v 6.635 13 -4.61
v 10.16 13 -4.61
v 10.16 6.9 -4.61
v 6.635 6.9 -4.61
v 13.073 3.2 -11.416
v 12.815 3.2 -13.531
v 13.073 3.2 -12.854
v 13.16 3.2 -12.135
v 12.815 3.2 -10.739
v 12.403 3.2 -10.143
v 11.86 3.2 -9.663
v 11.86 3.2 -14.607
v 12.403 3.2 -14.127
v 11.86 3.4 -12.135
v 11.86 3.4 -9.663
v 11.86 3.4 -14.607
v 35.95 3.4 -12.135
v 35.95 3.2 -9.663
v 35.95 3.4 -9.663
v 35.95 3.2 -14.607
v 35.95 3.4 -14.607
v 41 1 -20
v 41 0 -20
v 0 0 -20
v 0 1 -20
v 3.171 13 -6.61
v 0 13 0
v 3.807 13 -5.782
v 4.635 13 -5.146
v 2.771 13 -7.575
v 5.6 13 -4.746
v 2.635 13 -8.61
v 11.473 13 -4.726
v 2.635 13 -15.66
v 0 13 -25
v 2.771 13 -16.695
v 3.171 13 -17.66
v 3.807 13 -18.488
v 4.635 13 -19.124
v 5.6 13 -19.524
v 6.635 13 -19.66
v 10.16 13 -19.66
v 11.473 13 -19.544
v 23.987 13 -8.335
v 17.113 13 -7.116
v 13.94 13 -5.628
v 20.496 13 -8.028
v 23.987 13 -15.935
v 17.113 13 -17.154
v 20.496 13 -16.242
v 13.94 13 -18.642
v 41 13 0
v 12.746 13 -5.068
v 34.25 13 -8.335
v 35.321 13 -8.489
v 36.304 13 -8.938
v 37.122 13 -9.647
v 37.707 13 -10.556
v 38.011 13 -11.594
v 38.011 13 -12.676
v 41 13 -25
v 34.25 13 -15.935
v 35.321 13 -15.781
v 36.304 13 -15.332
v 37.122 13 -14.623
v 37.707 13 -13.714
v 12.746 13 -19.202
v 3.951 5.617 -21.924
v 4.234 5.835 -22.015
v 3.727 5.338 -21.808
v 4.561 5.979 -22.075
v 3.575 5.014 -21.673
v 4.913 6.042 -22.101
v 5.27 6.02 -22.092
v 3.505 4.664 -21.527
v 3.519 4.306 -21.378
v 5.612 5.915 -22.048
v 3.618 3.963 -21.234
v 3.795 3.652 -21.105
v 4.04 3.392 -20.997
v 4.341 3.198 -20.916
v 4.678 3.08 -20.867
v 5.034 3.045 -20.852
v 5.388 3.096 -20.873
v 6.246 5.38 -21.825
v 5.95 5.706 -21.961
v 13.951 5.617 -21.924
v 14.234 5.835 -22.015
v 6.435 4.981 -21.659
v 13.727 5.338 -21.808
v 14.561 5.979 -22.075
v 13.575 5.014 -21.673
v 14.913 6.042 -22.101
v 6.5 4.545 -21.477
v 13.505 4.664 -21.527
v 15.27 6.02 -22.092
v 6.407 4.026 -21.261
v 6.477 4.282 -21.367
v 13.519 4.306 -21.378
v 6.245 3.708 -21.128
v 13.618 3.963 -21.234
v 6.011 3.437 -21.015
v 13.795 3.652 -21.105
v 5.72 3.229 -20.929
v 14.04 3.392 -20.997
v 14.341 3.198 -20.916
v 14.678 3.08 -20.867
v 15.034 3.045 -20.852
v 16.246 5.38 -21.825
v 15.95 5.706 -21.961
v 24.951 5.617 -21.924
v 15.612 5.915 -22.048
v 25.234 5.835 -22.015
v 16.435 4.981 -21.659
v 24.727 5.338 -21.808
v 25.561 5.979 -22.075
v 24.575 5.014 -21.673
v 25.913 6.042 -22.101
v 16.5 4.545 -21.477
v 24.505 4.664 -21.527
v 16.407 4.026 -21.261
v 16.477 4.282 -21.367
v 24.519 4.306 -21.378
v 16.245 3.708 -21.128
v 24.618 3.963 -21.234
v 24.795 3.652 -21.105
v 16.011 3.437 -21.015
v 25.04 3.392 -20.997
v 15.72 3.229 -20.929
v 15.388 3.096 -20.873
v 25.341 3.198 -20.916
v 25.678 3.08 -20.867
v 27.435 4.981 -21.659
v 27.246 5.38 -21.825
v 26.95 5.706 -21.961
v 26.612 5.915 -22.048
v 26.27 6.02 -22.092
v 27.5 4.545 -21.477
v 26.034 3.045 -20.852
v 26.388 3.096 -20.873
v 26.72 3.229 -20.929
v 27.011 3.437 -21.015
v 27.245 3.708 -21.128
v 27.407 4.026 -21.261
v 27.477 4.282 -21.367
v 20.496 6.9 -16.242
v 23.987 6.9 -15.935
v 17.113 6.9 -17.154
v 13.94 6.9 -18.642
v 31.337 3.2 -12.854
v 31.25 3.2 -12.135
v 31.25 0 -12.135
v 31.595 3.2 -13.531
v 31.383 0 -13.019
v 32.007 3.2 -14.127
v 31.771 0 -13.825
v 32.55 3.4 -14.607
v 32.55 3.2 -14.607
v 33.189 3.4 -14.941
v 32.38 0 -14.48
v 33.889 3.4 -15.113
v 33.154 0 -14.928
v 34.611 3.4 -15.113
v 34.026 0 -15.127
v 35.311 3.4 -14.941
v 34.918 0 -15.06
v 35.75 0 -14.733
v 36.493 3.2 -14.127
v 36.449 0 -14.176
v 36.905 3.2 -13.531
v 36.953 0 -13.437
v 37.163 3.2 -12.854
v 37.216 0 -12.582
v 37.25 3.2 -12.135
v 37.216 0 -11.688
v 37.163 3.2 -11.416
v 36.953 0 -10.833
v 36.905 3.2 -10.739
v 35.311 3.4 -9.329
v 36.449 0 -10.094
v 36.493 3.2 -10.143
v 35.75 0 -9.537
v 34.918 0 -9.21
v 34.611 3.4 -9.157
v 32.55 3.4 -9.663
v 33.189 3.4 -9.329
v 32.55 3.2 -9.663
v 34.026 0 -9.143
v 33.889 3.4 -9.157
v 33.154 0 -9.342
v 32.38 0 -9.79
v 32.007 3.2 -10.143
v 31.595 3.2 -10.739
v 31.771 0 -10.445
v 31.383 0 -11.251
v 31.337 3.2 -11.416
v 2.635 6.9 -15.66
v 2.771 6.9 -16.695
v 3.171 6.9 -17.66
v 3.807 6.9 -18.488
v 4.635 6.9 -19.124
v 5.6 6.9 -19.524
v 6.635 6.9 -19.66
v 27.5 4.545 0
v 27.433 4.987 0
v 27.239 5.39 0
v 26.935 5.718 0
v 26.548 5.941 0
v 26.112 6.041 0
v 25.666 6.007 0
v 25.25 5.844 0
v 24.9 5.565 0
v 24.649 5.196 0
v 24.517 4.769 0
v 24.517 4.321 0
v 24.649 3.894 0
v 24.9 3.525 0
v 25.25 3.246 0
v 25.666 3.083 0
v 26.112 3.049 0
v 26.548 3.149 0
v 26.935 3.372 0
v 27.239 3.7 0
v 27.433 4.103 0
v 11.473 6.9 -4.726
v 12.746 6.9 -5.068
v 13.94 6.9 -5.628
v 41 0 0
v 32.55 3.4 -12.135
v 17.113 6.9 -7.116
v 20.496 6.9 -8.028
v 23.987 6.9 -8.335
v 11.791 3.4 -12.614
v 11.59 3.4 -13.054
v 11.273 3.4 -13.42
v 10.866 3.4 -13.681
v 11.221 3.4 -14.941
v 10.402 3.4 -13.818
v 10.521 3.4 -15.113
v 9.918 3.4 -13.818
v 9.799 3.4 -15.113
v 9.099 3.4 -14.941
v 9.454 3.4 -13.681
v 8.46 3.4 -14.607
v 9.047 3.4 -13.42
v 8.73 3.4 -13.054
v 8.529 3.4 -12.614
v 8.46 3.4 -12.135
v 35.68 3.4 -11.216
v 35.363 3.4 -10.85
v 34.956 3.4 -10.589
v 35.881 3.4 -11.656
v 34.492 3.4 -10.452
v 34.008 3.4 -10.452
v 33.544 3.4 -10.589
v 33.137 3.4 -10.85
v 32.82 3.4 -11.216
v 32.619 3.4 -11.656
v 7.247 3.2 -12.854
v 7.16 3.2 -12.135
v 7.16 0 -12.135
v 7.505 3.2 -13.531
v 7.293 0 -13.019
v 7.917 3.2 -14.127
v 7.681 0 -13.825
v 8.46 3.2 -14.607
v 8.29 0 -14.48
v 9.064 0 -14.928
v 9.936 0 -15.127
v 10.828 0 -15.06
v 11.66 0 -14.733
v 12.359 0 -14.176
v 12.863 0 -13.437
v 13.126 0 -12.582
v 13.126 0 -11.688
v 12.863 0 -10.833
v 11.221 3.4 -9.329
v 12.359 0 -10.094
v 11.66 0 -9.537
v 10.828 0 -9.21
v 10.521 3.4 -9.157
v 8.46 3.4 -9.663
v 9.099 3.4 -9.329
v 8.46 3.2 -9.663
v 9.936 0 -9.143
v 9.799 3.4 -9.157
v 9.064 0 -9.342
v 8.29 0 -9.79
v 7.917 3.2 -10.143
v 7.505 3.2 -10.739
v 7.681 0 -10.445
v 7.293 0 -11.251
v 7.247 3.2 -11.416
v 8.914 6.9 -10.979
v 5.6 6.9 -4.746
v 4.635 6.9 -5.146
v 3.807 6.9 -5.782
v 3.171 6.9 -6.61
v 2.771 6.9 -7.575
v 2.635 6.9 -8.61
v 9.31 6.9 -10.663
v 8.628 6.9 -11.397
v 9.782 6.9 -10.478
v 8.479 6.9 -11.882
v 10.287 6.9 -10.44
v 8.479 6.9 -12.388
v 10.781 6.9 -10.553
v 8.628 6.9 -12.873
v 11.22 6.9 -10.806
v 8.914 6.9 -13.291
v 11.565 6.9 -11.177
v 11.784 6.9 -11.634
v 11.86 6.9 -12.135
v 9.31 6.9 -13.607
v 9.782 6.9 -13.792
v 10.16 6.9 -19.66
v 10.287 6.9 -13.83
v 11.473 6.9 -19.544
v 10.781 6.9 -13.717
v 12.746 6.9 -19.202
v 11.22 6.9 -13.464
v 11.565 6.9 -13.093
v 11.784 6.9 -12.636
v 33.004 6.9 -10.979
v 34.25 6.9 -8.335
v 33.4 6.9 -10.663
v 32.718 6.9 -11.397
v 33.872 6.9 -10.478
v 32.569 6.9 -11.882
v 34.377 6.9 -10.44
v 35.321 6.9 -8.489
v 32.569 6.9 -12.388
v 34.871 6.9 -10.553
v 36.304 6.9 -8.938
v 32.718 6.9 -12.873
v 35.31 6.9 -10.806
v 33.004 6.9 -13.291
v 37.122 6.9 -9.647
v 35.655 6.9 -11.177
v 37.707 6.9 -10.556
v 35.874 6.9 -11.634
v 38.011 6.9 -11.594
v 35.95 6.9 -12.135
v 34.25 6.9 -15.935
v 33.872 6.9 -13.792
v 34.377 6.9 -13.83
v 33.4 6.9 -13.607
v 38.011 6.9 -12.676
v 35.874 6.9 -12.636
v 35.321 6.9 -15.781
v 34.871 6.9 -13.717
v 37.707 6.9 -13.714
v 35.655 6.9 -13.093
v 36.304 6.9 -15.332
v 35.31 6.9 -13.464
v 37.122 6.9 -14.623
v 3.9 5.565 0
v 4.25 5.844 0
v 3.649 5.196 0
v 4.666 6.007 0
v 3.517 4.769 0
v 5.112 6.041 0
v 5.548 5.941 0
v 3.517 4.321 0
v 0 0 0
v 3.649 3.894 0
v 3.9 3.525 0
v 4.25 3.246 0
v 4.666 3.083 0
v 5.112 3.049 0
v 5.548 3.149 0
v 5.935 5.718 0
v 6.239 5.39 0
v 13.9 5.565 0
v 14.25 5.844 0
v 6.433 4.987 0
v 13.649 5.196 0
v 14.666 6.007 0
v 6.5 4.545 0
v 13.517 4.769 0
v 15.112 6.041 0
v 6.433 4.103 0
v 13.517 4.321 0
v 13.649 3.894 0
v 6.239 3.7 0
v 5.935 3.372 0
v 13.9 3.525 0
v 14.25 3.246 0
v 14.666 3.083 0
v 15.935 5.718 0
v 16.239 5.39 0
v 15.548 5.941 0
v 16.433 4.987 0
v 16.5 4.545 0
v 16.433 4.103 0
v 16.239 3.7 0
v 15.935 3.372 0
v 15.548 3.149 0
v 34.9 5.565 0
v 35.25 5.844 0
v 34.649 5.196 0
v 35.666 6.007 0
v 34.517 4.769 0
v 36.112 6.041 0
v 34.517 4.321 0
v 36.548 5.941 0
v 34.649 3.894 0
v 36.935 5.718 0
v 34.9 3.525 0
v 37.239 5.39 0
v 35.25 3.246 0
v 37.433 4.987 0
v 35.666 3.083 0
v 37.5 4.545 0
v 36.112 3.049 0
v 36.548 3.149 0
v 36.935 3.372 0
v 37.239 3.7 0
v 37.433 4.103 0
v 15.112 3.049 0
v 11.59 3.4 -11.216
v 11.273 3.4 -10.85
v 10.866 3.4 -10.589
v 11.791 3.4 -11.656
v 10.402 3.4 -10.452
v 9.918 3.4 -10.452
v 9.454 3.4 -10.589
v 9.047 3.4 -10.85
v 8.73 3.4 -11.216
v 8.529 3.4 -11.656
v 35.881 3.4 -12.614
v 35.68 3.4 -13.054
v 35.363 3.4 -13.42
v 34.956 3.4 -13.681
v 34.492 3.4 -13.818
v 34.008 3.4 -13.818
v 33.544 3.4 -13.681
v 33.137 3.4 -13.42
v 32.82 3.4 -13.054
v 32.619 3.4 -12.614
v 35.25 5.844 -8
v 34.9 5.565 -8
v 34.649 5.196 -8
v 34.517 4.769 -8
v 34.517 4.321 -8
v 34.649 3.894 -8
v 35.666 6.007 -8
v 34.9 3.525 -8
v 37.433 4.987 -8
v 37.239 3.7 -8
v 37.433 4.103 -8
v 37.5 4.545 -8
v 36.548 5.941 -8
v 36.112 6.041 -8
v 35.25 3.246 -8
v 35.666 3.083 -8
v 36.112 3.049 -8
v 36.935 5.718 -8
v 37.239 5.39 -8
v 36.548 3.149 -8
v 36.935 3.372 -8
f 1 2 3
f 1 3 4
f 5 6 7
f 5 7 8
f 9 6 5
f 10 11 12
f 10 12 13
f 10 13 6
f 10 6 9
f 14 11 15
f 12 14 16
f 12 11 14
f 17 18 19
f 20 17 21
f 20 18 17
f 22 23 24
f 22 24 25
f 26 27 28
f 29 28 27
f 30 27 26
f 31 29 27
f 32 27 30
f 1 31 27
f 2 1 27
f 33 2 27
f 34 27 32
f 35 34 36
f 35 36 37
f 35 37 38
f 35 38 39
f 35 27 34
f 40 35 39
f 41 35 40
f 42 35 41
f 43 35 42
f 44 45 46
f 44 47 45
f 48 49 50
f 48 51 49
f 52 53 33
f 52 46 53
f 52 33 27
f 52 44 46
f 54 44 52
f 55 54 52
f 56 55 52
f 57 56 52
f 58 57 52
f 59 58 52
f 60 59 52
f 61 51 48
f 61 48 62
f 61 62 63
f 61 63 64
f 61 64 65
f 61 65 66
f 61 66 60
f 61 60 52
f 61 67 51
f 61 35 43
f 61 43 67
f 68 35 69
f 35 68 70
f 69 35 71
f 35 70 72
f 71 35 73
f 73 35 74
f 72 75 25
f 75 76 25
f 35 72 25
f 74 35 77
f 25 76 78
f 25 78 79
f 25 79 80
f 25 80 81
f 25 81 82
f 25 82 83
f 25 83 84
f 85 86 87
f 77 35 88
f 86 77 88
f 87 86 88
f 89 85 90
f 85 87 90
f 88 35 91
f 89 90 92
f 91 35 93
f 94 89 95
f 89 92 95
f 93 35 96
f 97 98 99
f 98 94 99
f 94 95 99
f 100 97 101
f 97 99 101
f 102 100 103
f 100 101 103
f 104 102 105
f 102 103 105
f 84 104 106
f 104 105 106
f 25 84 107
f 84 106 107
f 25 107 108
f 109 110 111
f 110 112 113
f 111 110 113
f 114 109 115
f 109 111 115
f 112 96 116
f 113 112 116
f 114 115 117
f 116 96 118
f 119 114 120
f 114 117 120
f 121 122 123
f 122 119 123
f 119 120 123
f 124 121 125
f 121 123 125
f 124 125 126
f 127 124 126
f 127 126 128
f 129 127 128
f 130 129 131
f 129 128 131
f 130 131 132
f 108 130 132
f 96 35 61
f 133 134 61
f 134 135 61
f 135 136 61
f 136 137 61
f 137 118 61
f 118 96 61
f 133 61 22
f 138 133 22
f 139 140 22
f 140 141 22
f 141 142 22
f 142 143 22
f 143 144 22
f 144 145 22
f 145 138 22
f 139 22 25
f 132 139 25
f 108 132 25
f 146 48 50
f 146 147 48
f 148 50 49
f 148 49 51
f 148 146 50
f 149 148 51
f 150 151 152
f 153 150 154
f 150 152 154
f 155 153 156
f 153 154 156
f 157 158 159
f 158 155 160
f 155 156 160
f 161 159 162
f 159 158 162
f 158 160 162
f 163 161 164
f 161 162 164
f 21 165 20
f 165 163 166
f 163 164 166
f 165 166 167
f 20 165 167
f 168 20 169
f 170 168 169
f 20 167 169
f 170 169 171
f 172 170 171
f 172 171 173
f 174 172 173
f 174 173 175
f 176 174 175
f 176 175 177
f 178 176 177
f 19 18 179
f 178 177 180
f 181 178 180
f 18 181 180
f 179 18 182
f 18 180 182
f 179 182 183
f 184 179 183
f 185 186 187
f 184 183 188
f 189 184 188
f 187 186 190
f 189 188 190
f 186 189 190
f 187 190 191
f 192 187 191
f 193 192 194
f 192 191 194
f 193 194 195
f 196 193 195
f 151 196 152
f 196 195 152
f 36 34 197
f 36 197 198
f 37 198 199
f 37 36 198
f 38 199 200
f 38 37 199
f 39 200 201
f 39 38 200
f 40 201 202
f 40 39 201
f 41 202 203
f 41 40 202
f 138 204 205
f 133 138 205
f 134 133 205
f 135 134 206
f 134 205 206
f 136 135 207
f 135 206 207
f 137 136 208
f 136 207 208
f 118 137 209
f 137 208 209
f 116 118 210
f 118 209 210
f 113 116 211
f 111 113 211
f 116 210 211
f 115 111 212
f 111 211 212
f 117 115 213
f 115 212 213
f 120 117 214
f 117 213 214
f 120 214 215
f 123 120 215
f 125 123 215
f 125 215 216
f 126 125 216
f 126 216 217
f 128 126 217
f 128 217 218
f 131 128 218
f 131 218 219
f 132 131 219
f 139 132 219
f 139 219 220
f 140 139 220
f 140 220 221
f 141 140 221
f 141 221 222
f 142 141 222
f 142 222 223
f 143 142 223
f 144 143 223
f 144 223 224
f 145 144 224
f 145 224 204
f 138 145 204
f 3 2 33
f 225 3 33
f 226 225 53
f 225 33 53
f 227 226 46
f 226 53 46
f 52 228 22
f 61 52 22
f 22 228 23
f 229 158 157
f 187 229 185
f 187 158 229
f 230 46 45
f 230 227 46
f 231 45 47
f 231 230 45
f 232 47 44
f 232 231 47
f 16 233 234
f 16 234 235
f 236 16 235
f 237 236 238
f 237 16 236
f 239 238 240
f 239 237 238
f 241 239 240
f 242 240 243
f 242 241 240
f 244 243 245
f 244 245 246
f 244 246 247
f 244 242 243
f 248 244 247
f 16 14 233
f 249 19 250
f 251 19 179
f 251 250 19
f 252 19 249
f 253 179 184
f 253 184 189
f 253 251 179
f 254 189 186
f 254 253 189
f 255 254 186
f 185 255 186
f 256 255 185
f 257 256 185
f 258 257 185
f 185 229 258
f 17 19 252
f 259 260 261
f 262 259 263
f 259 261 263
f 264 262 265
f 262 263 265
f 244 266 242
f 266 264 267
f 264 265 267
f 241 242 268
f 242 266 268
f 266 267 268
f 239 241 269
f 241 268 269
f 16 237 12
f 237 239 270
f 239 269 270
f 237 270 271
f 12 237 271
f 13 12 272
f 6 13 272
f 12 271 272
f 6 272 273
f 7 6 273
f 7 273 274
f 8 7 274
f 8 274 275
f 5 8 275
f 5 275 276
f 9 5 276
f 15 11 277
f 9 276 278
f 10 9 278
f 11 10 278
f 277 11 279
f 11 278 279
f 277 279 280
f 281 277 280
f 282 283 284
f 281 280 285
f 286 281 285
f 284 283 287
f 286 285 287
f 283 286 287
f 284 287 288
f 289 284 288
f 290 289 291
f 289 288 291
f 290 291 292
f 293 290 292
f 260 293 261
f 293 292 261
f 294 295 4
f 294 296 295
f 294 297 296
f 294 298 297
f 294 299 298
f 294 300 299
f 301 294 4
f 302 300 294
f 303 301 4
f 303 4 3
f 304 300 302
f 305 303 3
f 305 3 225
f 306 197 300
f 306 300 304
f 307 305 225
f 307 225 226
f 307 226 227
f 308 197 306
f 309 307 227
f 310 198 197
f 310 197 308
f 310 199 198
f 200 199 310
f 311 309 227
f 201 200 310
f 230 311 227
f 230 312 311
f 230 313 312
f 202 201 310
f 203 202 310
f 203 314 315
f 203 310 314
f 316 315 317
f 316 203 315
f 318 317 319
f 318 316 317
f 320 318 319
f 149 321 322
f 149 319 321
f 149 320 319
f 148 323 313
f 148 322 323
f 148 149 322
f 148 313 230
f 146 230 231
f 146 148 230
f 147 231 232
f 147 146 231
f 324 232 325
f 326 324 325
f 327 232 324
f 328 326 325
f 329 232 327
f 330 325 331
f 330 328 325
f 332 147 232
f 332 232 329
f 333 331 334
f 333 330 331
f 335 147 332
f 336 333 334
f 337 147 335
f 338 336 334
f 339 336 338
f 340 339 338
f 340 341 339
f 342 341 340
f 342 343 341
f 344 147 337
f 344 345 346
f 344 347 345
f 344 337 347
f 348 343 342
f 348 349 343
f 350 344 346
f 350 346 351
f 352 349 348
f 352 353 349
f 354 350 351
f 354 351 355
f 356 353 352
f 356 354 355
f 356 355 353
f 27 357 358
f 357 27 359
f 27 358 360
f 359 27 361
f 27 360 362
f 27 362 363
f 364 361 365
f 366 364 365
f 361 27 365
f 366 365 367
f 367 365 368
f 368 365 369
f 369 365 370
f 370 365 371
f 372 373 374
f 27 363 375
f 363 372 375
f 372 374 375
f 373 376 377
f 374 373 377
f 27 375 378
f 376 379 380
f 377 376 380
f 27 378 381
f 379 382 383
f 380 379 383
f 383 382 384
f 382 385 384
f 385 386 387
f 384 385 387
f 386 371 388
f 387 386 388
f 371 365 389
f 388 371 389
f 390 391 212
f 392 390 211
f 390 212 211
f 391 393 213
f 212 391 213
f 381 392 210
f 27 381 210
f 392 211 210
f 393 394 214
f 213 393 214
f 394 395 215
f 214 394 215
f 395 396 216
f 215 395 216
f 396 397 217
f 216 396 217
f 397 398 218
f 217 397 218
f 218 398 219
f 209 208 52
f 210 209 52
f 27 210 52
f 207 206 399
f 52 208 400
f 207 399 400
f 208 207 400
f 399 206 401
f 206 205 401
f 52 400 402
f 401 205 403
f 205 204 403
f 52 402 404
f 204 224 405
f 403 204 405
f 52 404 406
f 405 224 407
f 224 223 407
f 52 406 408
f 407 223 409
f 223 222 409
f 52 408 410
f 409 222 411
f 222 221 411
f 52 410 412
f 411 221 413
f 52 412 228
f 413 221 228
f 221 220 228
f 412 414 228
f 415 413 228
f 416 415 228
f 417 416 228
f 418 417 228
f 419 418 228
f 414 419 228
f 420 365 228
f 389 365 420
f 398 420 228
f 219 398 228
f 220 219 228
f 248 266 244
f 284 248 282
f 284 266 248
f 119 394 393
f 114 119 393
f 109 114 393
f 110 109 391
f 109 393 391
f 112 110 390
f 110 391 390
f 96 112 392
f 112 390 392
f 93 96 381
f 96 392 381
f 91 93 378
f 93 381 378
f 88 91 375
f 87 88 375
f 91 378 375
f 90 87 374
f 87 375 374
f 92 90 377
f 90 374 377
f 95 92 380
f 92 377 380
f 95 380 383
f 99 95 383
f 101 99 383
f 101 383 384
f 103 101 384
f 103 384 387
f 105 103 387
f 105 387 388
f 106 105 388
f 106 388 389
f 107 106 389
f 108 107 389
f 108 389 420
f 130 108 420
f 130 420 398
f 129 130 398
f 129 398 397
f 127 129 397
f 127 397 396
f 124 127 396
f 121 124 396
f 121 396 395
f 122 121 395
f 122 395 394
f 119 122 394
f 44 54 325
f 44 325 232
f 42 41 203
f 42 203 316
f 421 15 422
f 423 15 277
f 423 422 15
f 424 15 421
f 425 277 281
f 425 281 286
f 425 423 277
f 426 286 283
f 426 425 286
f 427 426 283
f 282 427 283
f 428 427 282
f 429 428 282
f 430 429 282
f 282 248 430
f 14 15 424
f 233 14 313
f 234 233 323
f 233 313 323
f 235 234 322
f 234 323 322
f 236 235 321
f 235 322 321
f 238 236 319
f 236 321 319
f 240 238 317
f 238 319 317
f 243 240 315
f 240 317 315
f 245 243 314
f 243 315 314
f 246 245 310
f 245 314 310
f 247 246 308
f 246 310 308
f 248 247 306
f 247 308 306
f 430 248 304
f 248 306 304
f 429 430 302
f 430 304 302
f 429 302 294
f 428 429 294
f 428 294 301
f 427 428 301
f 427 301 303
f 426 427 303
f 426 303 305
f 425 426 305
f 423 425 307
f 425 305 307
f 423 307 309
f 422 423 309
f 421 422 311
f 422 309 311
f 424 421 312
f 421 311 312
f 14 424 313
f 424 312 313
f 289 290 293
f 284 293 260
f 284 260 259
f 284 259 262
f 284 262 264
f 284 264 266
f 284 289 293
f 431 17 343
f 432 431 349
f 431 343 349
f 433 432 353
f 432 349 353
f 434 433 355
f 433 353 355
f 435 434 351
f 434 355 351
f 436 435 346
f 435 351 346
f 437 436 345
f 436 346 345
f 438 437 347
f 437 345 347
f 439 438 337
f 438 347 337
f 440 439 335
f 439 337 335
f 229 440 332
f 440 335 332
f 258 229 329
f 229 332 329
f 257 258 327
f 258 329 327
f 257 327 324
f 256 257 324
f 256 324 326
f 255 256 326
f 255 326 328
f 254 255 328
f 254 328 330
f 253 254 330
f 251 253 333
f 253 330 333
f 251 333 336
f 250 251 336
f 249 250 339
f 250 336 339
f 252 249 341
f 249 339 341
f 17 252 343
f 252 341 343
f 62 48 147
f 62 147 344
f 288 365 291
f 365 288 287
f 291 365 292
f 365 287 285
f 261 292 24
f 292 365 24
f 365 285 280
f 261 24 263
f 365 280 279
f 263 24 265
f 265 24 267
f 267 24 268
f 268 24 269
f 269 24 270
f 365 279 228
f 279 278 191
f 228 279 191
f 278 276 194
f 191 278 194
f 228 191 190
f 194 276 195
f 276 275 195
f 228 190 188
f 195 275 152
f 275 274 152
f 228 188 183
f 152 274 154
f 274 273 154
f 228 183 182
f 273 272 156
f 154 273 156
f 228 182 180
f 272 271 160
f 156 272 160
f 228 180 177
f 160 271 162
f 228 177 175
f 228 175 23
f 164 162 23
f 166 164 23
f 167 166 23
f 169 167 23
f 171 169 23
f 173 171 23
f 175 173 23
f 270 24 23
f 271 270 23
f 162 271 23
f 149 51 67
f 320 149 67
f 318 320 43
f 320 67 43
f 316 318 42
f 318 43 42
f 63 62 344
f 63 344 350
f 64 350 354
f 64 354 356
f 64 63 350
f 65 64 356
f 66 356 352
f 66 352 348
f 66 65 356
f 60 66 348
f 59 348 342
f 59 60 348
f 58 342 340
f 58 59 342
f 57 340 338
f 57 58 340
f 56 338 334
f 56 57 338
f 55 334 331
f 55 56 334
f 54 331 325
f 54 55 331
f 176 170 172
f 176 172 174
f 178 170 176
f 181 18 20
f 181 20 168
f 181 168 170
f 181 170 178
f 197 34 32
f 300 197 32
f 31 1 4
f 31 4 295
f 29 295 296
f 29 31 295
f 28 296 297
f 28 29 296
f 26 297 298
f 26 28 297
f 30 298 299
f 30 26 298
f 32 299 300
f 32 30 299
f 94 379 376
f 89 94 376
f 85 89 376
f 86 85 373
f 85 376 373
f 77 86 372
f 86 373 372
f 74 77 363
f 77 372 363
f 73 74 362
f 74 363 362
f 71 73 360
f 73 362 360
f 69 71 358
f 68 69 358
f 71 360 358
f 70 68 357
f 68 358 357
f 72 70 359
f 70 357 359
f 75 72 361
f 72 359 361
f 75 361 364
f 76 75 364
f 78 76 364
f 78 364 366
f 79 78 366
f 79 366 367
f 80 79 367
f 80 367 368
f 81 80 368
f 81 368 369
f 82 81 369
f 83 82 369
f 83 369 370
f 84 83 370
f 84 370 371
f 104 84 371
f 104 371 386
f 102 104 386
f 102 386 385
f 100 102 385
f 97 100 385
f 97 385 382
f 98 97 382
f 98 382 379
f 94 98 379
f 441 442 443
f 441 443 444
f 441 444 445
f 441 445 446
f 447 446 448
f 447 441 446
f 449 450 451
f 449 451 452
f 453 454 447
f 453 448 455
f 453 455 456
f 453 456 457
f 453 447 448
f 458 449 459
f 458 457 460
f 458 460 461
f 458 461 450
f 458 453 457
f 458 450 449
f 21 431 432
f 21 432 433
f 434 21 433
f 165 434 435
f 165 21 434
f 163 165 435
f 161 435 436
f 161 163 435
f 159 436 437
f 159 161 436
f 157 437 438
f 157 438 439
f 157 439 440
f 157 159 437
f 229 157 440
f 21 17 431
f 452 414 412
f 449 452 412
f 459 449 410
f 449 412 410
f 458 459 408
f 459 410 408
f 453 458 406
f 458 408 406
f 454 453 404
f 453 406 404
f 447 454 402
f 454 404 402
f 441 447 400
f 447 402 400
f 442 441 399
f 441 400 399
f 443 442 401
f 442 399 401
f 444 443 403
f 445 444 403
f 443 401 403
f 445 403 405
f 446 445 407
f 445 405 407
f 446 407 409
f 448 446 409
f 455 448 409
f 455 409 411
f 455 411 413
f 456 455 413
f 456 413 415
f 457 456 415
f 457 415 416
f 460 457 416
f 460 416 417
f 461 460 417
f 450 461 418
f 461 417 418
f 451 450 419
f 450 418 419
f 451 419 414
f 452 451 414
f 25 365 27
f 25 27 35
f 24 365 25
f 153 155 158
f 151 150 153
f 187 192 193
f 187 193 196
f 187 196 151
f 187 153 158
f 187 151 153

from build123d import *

# Parameters (mm, degrees)
SKETCH1_W                                           = 41
SKETCH1_H                                           = 25
BOSS_EXTRUDE1_DEPTH                                 = 13
SKETCH2_R                                           = 1.5
CUT_EXTRUDE1_DEPTH                                  = 50.749371855
LPATTERN1_COUNT                                     = 2
LPATTERN1_PITCH                                     = 10
LPATTERN3_COUNT                                     = 2
LPATTERN3_PITCH                                     = 21
SKETCH8_R                                           = 1.5
CUT_EXTRUDE5_DEPTH                                  = 8
SKETCH3_R                                           = 7.525
CUT_EXTRUDE2_DEPTH                                  = 6.1
CBORE_FOR_M3_HEX_SOCKET_HEAD_CAP_SCREW1_D           = 3.4
CBORE_FOR_M3_HEX_SOCKET_HEAD_CAP_SCREW1_CBORE_D     = 6
CBORE_FOR_M3_HEX_SOCKET_HEAD_CAP_SCREW1_CBORE_DEPTH = 3.4
FILLET1_R                                           = 20
CUT_EXTRUDE4_DEPTH                                  = 50.749371855
CUT_EXTRUDE4_DEPTH_BACK                             = 50.749371855
BOSS_EXTRUDE3_START                                 = 0.2
BOSS_EXTRUDE3_DEPTH                                 = 0.2
LPATTERN2_COUNT                                     = 2
LPATTERN2_PITCH                                     = 24.09


with BuildPart() as part:
    # Sketch1 → Boss-Extrude1 (new body)
    with BuildSketch(Plane(origin=(0, 0, 0), x_dir=(1, 0, 0), z_dir=(0, 1, 0))):
        with Locations((20.5, 12.5)):
            Rectangle(SKETCH1_W, SKETCH1_H)
    extrude(amount=BOSS_EXTRUDE1_DEPTH)

    # Sketch2 → Cut-Extrude1 (cut, through all)
    with BuildSketch(Plane.XY):
        with Locations((5, 4.545)):
            Circle(SKETCH2_R)
    cut_extrude1 = extrude(amount=-CUT_EXTRUDE1_DEPTH, mode=Mode.SUBTRACT)

    # LPattern1: Cut-Extrude1 ×2
    with Locations(*[(i * LPATTERN1_PITCH, 0, 0) for i in range(1, LPATTERN1_COUNT)]):
        add(cut_extrude1, mode=Mode.SUBTRACT)

    # LPattern3: Cut-Extrude1 ×2
    with Locations(*[(i * LPATTERN3_PITCH, 0, 0) for i in range(1, LPATTERN3_COUNT)]):
        add(cut_extrude1, mode=Mode.SUBTRACT)

    # Sketch8 → Cut-Extrude5 (cut)
    with BuildSketch(Plane.XY):
        with Locations((36, 4.545)):
            Circle(SKETCH8_R)
    extrude(amount=-CUT_EXTRUDE5_DEPTH, mode=Mode.SUBTRACT)

    # Sketch3 → Cut-Extrude2 (cut)
    with BuildSketch(Plane(origin=(0, 13, 0), x_dir=(1, 0, 0), z_dir=(0, 1, 0))):
        with Locations((10.16, 12.135)):
            Circle(SKETCH3_R)
        with BuildLine():
            Line((34.25, 8.335), (10.16, 8.335))
            ThreePointArc((10.16, 8.335), (6.36, 12.135), (10.16, 15.935))
            Line((10.16, 15.935), (34.25, 15.935))
            ThreePointArc((34.25, 15.935), (38.05, 12.135), (34.25, 8.335))
        make_face()
        with BuildLine():
            Line((10.16, 4.61), (6.635, 4.61))
            ThreePointArc((6.635, 4.61), (3.806572875, 5.781572875), (2.635, 8.61))
            Line((2.635, 8.61), (2.635, 15.66))
            ThreePointArc((2.635, 15.66), (3.806572875, 18.488427125), (6.635, 19.66))
            Line((6.635, 19.66), (10.16, 19.66))
            Line((10.16, 19.66), (10.16, 4.61))
        make_face()
    extrude(amount=-CUT_EXTRUDE2_DEPTH, mode=Mode.SUBTRACT)

    # CBORE for M3 Hex Socket Head Cap Screw1 (through all)
    with Locations(Plane(origin=(0, 0, 0), x_dir=(-1, 0, 0), z_dir=(0, -1, 0))):
        with Locations((-34.25, 12.135), (-10.16, 12.135)):
            CounterBoreHole(CBORE_FOR_M3_HEX_SOCKET_HEAD_CAP_SCREW1_D / 2, CBORE_FOR_M3_HEX_SOCKET_HEAD_CAP_SCREW1_CBORE_D / 2, CBORE_FOR_M3_HEX_SOCKET_HEAD_CAP_SCREW1_CBORE_DEPTH)

    # Fillet1
    fillet1_edges = [part.edges().sort_by_distance(p)[0] for p in [
        (16.655046189, 9.95, -15.935),
        (16.655046189, 9.95, -8.335),
    ]]
    fillet(fillet1_edges, radius=FILLET1_R)

    # Sketch7 → Cut-Extrude4 (cut, two sides: drawn at the far end of the back side and taken through both)
    with BuildSketch(Plane.ZY.offset(-CUT_EXTRUDE4_DEPTH_BACK)):
        Polygon((-50.521542775, 74.251702659), (-25, 13), (-20, 1), (-20, 0), (-20, -66.356011214), (-149.691728644, -94.508034559), (-180.213271419, 46.099679315), align=None)
    extrude(amount=CUT_EXTRUDE4_DEPTH + CUT_EXTRUDE4_DEPTH_BACK, mode=Mode.SUBTRACT)

    # Sketch9 → Boss-Extrude3 (add)
    with BuildSketch(Plane.XZ.offset(-3.4).offset(BOSS_EXTRUDE3_START)):
        with BuildLine():
            Line((8.46, -14.606841419), (8.46, -9.663158581))
            ThreePointArc((8.46, -9.663158581), (7.16, -12.135), (8.46, -14.606841419))
        make_face()
        with BuildLine():
            ThreePointArc((13.16, -12.135), (12.815183609, -10.738575996), (11.86, -9.663158581))
            Line((11.86, -9.663158581), (11.86, -14.606841419))
            ThreePointArc((11.86, -14.606841419), (12.815183609, -13.531424004), (13.16, -12.135))
        make_face()
    boss_extrude3 = extrude(amount=-BOSS_EXTRUDE3_DEPTH)

    # LPattern2: Boss-Extrude3 ×2
    with Locations(*[(i * LPATTERN2_PITCH, 0, 0) for i in range(1, LPATTERN2_COUNT)]):
        add(boss_extrude3)


solid = part.part
